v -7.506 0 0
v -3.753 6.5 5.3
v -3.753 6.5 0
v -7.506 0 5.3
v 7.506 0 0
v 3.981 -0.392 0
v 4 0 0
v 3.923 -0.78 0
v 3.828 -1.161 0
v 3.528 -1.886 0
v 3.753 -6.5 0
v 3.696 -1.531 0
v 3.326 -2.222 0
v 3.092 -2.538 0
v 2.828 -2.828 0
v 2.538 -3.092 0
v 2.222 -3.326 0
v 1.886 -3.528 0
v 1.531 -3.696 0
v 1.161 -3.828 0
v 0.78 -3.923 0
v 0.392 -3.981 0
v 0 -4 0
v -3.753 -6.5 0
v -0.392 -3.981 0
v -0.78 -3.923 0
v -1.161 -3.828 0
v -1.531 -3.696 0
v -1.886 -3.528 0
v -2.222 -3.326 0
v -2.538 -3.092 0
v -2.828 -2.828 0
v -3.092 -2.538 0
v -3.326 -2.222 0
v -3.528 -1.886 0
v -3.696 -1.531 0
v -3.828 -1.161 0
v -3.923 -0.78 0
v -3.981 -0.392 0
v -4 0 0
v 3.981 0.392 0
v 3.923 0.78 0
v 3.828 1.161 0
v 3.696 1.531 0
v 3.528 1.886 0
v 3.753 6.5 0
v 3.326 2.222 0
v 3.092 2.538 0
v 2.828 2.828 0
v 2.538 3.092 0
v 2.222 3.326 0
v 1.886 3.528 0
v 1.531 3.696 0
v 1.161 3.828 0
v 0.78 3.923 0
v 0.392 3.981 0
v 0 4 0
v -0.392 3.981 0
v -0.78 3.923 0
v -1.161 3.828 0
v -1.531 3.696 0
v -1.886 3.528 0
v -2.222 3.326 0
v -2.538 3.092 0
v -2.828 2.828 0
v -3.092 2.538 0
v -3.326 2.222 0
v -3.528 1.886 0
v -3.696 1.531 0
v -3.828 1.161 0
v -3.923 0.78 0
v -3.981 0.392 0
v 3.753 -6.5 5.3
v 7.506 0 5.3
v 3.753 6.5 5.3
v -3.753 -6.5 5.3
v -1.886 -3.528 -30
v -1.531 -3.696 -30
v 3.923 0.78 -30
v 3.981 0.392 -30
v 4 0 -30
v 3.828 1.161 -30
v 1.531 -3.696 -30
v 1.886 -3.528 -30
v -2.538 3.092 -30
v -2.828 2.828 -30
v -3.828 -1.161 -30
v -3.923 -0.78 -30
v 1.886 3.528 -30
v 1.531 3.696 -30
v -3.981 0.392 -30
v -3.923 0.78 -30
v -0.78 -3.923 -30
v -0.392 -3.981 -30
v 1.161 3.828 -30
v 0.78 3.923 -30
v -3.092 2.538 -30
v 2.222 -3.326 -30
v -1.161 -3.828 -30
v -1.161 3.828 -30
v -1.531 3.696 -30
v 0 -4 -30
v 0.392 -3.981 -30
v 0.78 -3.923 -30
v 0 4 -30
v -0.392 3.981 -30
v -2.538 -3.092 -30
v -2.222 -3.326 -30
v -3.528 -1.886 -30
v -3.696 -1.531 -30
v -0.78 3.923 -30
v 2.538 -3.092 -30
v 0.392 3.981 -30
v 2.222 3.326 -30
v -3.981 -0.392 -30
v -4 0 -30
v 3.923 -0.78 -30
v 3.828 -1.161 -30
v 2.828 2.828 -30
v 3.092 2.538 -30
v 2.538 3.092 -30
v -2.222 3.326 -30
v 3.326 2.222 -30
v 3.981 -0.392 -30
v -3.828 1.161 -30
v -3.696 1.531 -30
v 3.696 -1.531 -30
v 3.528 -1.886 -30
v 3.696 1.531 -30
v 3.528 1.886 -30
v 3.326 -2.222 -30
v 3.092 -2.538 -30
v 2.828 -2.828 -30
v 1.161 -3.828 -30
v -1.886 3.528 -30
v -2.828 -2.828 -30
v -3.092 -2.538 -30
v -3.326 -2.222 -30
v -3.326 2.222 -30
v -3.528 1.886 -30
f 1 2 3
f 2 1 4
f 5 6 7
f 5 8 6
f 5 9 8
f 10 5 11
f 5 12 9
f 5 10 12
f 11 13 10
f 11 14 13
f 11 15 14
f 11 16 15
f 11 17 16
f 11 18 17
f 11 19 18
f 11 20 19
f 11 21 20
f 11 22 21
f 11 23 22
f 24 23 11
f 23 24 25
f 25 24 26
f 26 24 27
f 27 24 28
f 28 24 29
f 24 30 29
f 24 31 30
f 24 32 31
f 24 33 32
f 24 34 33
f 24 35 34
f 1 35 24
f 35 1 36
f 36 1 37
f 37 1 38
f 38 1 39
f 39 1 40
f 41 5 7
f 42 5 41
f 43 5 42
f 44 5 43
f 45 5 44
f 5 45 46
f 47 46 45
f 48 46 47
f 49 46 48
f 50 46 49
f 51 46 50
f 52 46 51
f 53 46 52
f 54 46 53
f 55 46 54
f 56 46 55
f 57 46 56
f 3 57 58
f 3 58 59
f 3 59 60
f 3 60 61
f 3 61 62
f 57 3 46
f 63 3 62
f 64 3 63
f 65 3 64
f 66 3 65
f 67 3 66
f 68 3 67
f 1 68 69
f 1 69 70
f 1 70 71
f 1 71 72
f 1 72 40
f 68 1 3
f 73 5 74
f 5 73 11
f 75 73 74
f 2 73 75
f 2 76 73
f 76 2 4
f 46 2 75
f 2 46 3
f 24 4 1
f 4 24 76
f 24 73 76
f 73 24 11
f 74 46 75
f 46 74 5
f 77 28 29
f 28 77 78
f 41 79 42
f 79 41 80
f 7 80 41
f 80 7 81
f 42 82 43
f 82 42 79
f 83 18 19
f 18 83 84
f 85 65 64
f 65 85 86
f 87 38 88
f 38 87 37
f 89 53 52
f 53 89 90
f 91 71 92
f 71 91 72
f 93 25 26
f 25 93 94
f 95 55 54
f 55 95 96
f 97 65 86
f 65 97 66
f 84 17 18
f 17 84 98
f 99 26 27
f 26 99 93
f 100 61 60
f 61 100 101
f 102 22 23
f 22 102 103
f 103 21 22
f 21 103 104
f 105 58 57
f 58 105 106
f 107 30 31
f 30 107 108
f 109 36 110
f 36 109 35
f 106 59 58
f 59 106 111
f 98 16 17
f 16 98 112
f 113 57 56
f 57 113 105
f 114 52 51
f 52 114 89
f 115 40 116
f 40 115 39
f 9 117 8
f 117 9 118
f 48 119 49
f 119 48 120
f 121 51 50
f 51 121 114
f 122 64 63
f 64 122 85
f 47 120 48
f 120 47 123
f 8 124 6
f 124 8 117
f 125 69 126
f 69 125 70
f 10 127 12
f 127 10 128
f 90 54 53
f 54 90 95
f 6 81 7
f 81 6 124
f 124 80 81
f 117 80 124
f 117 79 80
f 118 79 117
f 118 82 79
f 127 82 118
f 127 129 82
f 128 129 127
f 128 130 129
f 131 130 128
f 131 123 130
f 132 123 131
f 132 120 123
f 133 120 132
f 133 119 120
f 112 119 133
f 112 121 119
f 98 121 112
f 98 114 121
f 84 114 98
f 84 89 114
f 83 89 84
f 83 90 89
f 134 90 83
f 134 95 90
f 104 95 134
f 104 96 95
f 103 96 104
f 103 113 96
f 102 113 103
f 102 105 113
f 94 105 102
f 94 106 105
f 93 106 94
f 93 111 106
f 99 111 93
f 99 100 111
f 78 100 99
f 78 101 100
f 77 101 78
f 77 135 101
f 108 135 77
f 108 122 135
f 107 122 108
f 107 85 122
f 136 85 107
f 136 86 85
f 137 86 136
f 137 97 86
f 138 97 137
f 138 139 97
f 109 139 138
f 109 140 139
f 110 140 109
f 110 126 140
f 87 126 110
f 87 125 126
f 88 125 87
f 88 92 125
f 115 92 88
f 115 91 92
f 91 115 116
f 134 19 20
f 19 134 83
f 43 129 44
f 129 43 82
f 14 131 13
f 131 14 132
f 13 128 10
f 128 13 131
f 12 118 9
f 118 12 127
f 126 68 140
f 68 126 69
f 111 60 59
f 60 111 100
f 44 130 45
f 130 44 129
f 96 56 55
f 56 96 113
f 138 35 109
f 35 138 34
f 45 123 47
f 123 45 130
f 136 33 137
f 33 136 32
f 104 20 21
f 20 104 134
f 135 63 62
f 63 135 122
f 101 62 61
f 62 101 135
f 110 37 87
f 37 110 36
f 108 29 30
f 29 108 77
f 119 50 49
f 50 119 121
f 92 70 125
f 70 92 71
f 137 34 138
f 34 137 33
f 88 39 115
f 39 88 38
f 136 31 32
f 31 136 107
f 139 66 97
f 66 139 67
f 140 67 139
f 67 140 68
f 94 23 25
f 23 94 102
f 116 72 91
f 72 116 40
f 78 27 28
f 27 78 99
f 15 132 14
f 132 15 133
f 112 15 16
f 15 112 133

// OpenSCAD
// M8 Hex Bolt (threads omitted, cylindrical shank)
// Head bottom face at z=0, shank extends in -Z direction

// Parameters
across_flats = 13;    // Head across-flats distance (mm)
head_height  = 5.3;   // Head height (mm)
shank_dia    = 8;     // Shank diameter (mm)
shank_length = 30;    // Shank length (mm)

// Circumradius of regular hexagon from across-flats distance
hex_r = across_flats / (2 * cos(30));

// Hex head: from z=0 to z=+head_height
module hex_head() {
    linear_extrude(height = head_height) {
        circle(r = hex_r, $fn = 6);
    }
}

// Shank: from z=0 to z=-shank_length
module shank() {
    translate([0, 0, -shank_length]) {
        cylinder(h = shank_length, d = shank_dia, $fn = 64);
    }
}

// Assemble
union() {
    hex_head();
    shank();
}
